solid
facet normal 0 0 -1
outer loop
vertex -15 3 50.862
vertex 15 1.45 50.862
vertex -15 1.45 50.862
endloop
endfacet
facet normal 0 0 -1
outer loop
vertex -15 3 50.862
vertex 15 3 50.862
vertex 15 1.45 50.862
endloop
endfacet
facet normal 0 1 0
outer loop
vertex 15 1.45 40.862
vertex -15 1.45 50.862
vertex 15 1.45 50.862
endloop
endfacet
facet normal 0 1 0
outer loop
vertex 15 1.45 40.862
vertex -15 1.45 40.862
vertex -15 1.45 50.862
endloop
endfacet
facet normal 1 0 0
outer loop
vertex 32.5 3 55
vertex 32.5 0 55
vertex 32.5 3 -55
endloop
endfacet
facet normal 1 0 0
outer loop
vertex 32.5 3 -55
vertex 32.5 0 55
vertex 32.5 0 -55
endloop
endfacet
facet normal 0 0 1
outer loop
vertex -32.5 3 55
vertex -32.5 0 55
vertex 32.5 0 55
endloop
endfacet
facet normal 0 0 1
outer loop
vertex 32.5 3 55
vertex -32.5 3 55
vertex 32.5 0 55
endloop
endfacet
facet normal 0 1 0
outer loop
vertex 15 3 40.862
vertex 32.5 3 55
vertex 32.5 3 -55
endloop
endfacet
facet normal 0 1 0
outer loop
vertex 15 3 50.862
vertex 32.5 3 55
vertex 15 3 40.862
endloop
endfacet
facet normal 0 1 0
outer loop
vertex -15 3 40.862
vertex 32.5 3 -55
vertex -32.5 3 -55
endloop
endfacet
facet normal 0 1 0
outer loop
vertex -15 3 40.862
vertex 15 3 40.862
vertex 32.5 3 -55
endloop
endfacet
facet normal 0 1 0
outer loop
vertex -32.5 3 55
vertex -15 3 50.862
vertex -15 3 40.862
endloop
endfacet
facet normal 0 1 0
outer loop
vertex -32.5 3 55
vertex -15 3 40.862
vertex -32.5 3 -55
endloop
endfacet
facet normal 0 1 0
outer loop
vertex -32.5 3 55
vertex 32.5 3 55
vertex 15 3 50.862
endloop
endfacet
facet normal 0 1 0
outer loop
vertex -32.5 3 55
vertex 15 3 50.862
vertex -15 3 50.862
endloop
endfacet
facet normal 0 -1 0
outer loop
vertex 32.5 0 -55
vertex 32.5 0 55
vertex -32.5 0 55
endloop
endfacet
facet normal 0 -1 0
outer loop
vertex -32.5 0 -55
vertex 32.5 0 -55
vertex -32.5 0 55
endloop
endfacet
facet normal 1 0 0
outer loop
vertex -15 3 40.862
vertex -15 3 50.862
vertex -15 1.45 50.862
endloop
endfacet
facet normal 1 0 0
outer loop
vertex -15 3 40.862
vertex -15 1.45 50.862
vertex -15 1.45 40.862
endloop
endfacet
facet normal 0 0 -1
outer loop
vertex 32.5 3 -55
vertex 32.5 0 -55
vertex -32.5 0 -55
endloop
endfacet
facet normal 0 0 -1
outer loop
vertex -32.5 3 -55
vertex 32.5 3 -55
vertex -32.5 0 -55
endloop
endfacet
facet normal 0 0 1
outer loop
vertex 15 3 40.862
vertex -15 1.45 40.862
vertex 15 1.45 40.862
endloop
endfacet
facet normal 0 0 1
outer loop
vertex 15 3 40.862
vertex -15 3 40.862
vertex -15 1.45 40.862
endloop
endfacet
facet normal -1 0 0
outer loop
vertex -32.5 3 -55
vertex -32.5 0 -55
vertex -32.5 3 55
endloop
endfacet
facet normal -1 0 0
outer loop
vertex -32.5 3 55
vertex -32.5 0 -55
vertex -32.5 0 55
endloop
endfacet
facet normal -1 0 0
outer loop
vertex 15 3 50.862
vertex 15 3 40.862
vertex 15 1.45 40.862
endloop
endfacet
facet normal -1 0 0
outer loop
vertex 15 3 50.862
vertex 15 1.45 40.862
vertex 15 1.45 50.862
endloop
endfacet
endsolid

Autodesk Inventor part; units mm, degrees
ref_plane "YZ Plane" through (0, 0, 0) normal (1, 0, 0) x (0, 1, 0)
ref_plane "XZ Plane" through (0, 0, 0) normal (0, 1, 0) x (-1, 0, 0)
ref_plane "XY Plane" through (0, 0, 0) normal (0, 0, 1) x (1, 0, 0)
sketch "Sketch1" plane through (0, 0, 0) normal (0, 1, 0) x (-1, 0, 0)
  line L0 (-32.5, -55) -> (32.5, -55)
  line L1 (32.5, -55) -> (32.5, 55)
  line L2 (32.5, 55) -> (-32.5, 55)
  line L3 (-32.5, 55) -> (-32.5, -55)
  line L4 (-32.5, -55) -> (32.5, 55) construction
  line L5 (32.5, -55) -> (-32.5, 55) construction
  point P0 (0, 0)
  dimension "Sliding_Plate_Length" = 65
  dimension "Sliding_Plate_Width" = 110
extrude "Extrusion1" add sketch "Sketch1" along normal blind 3
sketch "Sketch2" plane through (0, 3, 0) normal (0, 1, 0) x (1, 0, 0)
  line L0 (-32.5, 55) -> (-32.5, -55) projected
  line L1 (-32.5, -55) -> (32.5, -55) projected
  line L2 (32.5, -55) -> (32.5, 55) projected
  line L3 (32.5, 55) -> (-32.5, 55) projected
  point P0 (0, 0)
sketch "Sketch3" plane through (0, 3, 0) normal (0, 1, 0) x (1, 0, 0)
  line L0 (15, -50.862) -> (-15, -50.862)
  line L1 (-15, -50.862) -> (-15, -40.862)
  line L2 (-15, -40.862) -> (15, -40.862)
  line L3 (15, -40.862) -> (15, -50.862)
  line L4 (15, -50.862) -> (-15, -40.862) construction
  line L5 (-15, -50.862) -> (15, -40.862) construction
  point P0 (0, 0)
  point P1 (0, -45.862)
  dimension "d6" = 30
  dimension "d7" = 10
extrude "Extrusion2" cut sketch "Sketch3" against normal blind 1.55
properties part number "Rear_Port_Slider"
